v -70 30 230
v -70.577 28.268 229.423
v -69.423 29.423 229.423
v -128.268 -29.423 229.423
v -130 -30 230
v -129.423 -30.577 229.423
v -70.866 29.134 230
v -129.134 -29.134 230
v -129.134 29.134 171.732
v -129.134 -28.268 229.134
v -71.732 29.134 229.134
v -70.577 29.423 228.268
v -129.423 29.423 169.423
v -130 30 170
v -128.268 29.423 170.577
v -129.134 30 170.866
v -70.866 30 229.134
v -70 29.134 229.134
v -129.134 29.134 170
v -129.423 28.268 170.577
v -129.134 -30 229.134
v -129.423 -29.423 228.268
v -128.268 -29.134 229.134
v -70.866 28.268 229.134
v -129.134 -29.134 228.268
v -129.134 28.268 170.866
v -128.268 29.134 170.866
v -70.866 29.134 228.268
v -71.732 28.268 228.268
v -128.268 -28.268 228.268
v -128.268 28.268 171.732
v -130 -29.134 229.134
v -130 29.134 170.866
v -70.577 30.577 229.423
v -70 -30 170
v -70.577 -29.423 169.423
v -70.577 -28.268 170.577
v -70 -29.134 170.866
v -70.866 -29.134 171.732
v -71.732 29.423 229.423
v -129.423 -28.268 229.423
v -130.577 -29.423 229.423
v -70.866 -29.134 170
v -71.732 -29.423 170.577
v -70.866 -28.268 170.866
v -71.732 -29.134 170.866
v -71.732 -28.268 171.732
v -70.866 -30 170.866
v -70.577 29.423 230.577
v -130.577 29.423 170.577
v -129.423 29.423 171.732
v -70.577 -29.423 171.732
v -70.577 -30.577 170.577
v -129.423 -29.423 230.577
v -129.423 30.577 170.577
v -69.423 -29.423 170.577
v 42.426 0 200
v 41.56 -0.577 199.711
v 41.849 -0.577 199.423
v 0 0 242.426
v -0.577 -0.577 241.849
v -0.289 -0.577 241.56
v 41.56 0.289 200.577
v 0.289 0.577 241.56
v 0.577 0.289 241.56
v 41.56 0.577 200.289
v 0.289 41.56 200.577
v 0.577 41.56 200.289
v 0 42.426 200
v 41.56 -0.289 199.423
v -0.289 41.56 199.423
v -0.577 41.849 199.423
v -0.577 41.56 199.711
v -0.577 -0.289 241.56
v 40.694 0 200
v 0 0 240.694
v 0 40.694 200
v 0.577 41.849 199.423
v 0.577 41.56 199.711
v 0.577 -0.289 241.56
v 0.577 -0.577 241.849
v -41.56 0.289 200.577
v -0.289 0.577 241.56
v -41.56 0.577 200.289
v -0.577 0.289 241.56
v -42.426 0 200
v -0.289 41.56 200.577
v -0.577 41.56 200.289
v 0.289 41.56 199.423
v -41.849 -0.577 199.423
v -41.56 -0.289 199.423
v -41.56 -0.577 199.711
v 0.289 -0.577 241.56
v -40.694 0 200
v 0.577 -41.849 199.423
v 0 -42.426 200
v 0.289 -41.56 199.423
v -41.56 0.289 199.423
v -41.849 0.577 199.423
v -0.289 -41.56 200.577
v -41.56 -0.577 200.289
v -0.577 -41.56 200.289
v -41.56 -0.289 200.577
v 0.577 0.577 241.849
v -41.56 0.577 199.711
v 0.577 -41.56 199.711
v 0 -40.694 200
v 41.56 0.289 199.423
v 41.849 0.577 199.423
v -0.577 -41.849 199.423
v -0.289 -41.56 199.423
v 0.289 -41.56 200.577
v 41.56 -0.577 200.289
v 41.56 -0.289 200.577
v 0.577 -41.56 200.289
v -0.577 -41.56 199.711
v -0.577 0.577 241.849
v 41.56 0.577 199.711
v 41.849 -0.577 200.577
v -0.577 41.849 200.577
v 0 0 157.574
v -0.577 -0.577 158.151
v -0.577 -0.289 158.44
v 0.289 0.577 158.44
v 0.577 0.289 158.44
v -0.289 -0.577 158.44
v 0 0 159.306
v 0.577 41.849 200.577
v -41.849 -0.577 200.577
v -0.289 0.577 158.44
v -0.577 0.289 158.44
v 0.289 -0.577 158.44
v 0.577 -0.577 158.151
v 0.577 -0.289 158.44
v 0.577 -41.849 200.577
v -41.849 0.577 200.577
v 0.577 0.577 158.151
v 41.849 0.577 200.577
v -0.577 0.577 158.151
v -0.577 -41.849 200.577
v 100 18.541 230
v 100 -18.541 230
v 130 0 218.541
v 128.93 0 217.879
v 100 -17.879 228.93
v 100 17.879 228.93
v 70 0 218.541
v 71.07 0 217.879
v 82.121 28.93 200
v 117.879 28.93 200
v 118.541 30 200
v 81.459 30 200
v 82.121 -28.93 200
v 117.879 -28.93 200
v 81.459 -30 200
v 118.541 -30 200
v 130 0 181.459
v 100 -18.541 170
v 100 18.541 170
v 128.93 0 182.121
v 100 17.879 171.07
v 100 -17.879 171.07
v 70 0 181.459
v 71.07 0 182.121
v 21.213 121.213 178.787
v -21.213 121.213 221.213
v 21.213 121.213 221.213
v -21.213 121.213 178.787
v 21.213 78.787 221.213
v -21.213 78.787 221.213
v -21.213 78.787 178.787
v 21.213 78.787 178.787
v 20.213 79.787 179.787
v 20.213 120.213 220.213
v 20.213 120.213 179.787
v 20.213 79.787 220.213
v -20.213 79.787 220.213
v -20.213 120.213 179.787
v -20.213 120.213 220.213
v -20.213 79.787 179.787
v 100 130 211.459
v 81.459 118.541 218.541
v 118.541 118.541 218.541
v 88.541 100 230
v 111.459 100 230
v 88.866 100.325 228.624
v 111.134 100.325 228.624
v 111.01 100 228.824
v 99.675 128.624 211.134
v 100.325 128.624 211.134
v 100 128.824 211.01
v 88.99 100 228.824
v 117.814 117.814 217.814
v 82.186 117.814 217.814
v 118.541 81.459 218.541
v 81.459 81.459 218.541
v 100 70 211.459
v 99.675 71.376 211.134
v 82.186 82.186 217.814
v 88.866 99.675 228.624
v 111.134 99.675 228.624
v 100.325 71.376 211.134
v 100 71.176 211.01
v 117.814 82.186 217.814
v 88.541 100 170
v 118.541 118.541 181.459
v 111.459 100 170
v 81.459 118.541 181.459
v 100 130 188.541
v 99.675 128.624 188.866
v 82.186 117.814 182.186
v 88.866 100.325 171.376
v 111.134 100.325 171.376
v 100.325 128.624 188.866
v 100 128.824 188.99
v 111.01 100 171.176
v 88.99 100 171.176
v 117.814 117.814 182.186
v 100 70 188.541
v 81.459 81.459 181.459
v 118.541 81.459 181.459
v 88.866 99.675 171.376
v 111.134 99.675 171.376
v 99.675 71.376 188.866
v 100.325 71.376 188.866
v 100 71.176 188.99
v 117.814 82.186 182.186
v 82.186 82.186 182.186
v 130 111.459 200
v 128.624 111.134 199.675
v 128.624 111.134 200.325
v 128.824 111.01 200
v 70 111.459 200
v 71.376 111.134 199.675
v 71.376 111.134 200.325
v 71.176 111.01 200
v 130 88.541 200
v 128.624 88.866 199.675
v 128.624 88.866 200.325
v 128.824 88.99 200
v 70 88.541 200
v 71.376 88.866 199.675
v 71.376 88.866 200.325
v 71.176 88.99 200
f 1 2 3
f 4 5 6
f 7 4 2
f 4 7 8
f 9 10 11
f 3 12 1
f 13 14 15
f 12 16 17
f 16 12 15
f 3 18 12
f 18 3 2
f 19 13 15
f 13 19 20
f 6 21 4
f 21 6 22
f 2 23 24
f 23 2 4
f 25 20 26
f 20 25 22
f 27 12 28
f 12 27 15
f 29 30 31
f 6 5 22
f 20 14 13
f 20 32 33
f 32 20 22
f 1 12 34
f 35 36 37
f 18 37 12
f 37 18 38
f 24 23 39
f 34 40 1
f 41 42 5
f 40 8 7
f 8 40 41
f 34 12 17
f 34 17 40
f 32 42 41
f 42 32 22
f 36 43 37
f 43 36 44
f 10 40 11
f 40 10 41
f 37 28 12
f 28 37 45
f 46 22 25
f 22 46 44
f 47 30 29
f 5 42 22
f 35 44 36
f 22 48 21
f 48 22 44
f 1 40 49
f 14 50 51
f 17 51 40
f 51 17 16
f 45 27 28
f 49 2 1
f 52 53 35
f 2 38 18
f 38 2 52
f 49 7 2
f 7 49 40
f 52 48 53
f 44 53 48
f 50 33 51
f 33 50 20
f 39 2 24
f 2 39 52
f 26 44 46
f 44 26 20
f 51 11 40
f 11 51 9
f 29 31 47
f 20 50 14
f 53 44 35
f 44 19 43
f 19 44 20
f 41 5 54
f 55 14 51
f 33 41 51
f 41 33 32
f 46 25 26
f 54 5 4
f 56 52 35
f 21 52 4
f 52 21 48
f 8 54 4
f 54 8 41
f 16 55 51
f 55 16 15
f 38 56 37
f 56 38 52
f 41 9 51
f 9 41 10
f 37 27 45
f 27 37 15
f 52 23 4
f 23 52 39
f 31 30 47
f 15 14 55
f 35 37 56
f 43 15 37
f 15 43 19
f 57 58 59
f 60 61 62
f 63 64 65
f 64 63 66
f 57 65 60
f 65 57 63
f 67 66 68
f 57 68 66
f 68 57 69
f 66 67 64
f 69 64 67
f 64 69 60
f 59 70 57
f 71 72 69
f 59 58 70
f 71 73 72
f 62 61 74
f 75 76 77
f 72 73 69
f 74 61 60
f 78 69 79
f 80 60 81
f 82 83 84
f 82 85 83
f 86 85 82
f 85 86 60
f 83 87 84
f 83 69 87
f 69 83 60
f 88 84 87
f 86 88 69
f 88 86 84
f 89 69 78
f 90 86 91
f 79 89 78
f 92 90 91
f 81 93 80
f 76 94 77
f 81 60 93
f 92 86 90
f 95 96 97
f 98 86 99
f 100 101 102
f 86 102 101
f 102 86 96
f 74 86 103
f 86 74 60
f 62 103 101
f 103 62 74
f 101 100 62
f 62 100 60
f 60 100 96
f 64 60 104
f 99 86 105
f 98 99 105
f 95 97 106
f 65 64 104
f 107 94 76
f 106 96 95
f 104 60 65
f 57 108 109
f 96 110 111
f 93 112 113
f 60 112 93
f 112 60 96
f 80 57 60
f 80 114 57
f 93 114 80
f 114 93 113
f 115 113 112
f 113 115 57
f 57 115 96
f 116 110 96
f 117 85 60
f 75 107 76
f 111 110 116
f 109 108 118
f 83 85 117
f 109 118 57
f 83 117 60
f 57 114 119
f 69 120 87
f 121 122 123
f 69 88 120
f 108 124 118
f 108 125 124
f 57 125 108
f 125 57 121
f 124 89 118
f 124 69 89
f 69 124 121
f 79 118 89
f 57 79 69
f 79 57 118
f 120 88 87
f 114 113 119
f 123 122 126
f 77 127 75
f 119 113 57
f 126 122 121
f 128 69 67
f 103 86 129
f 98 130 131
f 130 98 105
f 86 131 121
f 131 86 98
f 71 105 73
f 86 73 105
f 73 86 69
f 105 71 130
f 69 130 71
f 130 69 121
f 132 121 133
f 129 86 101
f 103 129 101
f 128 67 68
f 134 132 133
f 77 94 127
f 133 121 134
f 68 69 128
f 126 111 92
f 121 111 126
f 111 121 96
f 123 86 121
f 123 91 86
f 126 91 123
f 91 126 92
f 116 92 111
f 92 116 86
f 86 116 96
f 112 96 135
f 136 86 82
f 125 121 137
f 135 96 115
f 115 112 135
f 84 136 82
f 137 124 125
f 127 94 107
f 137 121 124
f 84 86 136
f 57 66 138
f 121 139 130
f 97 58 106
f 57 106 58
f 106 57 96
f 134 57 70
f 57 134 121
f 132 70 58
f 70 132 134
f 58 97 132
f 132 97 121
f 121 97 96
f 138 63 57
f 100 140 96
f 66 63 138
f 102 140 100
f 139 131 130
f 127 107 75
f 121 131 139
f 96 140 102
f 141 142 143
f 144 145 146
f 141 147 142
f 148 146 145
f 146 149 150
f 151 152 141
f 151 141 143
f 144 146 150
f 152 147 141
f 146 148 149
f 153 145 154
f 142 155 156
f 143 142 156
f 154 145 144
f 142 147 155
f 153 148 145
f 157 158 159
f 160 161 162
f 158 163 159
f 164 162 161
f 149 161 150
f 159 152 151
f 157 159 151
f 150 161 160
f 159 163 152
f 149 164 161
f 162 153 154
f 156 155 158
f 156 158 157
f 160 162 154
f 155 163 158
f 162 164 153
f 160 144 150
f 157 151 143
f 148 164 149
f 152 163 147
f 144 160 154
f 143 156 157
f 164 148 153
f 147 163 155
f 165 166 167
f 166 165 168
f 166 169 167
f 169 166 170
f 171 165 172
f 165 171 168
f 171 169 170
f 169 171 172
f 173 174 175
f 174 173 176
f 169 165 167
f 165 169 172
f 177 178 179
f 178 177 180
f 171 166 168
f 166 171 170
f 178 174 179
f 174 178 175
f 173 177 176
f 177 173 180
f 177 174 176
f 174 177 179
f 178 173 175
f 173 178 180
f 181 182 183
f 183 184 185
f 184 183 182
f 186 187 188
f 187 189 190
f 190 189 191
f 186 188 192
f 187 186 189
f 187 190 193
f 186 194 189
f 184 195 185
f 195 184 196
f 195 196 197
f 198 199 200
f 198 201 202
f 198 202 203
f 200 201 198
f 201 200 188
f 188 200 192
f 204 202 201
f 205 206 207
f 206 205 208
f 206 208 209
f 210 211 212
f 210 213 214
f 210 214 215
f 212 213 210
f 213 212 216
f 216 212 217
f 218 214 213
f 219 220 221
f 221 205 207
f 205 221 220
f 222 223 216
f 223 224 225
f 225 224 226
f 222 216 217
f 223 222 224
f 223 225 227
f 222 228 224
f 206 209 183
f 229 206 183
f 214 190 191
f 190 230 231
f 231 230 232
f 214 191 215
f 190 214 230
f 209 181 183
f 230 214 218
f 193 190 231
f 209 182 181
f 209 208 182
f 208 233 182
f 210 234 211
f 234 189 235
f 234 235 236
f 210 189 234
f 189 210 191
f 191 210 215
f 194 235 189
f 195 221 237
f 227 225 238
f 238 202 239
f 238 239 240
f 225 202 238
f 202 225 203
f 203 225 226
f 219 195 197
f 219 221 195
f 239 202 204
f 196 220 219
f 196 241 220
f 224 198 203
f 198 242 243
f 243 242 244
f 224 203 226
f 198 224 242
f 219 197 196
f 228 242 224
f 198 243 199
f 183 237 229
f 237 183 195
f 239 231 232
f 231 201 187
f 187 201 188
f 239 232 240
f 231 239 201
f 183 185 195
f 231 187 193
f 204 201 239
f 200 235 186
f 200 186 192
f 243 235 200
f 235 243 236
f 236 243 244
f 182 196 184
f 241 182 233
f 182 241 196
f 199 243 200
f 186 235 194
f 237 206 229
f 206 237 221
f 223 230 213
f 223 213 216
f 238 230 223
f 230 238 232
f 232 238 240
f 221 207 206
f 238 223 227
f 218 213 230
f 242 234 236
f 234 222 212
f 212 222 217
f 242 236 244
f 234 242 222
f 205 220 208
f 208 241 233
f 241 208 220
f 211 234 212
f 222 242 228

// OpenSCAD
/*
 * This file is part of PolySymmetrica, a Polyhedral Geometry Modelling System.
 * Copyright 2025-2026 Susan Witts
 * SPDX-License-Identifier: MIT
 */

use <../../polysymmetrica/core/placement.scad>
use <../../polysymmetrica/models/platonics_all.scad>

// Inter-radius - sets the size of the shapes
IR = 30;

DISPLAY_OFFSET_EXAMPLE = 200; // set to 0 to overlay edge examples onto other examples

COLORS = [ "black", "red", "green", "yellow", "blue", "magenta", "cyan", "white", "orange" ];
module color_map(L, i) { color(COLORS[L[i]]) children(); }

translate([0,0,DISPLAY_OFFSET_EXAMPLE]) {
    // Triangular-faced regular polyhedra
    translate([-100, 0, 0])
    place_on_faces(tetrahedron(), IR) {
        color_map([1, 4, 2, 3], $ps_face_idx)
            translate([0,0,-1]) cylinder(h = 1, r = $ps_face_radius, $fn = $ps_vertex_count);
    }

    translate([0, 0, 0])
    place_on_faces(octahedron(), IR) {
        color_map([1, 4, 2, 3, 2, 3, 1, 4], $ps_face_idx)
            translate([0,0,-1]) cylinder(h = 1, r = $ps_face_radius, $fn = $ps_vertex_count);
    }


    translate([100, 0, 0])
    place_on_faces(icosahedron(), IR) {
        color_map([1, 4, 2, 3, 8, 3, 8, 2, 3, 2,    1, 8, 4, 4, 1, 8, 4, 3, 2, 1 ], $ps_face_idx)
            translate([0,0,-1]) cylinder(h = 1, r = $ps_face_radius, $fn = $ps_vertex_count);
    }

    // Duals
    translate([0, 100, 0])
    place_on_faces(hexahedron(), IR) {
        color_map([1, 8, 4, 3, 7, 2 ], $ps_face_idx)
            translate([0,0,-1]) cylinder(h = 1, r = $ps_face_radius, $fn = $ps_vertex_count);
    }

    translate([100, 100, 0])
    place_on_faces(dodecahedron(), IR) {
        color_map([ 1, 4, 3, 4, 4, 2, 3, 2, 2, 3, 1, 1 ], $ps_face_idx)
            translate([0,0,-1]) cylinder(h = 1, r = $ps_face_radius, $fn = $ps_vertex_count);
    }
}
